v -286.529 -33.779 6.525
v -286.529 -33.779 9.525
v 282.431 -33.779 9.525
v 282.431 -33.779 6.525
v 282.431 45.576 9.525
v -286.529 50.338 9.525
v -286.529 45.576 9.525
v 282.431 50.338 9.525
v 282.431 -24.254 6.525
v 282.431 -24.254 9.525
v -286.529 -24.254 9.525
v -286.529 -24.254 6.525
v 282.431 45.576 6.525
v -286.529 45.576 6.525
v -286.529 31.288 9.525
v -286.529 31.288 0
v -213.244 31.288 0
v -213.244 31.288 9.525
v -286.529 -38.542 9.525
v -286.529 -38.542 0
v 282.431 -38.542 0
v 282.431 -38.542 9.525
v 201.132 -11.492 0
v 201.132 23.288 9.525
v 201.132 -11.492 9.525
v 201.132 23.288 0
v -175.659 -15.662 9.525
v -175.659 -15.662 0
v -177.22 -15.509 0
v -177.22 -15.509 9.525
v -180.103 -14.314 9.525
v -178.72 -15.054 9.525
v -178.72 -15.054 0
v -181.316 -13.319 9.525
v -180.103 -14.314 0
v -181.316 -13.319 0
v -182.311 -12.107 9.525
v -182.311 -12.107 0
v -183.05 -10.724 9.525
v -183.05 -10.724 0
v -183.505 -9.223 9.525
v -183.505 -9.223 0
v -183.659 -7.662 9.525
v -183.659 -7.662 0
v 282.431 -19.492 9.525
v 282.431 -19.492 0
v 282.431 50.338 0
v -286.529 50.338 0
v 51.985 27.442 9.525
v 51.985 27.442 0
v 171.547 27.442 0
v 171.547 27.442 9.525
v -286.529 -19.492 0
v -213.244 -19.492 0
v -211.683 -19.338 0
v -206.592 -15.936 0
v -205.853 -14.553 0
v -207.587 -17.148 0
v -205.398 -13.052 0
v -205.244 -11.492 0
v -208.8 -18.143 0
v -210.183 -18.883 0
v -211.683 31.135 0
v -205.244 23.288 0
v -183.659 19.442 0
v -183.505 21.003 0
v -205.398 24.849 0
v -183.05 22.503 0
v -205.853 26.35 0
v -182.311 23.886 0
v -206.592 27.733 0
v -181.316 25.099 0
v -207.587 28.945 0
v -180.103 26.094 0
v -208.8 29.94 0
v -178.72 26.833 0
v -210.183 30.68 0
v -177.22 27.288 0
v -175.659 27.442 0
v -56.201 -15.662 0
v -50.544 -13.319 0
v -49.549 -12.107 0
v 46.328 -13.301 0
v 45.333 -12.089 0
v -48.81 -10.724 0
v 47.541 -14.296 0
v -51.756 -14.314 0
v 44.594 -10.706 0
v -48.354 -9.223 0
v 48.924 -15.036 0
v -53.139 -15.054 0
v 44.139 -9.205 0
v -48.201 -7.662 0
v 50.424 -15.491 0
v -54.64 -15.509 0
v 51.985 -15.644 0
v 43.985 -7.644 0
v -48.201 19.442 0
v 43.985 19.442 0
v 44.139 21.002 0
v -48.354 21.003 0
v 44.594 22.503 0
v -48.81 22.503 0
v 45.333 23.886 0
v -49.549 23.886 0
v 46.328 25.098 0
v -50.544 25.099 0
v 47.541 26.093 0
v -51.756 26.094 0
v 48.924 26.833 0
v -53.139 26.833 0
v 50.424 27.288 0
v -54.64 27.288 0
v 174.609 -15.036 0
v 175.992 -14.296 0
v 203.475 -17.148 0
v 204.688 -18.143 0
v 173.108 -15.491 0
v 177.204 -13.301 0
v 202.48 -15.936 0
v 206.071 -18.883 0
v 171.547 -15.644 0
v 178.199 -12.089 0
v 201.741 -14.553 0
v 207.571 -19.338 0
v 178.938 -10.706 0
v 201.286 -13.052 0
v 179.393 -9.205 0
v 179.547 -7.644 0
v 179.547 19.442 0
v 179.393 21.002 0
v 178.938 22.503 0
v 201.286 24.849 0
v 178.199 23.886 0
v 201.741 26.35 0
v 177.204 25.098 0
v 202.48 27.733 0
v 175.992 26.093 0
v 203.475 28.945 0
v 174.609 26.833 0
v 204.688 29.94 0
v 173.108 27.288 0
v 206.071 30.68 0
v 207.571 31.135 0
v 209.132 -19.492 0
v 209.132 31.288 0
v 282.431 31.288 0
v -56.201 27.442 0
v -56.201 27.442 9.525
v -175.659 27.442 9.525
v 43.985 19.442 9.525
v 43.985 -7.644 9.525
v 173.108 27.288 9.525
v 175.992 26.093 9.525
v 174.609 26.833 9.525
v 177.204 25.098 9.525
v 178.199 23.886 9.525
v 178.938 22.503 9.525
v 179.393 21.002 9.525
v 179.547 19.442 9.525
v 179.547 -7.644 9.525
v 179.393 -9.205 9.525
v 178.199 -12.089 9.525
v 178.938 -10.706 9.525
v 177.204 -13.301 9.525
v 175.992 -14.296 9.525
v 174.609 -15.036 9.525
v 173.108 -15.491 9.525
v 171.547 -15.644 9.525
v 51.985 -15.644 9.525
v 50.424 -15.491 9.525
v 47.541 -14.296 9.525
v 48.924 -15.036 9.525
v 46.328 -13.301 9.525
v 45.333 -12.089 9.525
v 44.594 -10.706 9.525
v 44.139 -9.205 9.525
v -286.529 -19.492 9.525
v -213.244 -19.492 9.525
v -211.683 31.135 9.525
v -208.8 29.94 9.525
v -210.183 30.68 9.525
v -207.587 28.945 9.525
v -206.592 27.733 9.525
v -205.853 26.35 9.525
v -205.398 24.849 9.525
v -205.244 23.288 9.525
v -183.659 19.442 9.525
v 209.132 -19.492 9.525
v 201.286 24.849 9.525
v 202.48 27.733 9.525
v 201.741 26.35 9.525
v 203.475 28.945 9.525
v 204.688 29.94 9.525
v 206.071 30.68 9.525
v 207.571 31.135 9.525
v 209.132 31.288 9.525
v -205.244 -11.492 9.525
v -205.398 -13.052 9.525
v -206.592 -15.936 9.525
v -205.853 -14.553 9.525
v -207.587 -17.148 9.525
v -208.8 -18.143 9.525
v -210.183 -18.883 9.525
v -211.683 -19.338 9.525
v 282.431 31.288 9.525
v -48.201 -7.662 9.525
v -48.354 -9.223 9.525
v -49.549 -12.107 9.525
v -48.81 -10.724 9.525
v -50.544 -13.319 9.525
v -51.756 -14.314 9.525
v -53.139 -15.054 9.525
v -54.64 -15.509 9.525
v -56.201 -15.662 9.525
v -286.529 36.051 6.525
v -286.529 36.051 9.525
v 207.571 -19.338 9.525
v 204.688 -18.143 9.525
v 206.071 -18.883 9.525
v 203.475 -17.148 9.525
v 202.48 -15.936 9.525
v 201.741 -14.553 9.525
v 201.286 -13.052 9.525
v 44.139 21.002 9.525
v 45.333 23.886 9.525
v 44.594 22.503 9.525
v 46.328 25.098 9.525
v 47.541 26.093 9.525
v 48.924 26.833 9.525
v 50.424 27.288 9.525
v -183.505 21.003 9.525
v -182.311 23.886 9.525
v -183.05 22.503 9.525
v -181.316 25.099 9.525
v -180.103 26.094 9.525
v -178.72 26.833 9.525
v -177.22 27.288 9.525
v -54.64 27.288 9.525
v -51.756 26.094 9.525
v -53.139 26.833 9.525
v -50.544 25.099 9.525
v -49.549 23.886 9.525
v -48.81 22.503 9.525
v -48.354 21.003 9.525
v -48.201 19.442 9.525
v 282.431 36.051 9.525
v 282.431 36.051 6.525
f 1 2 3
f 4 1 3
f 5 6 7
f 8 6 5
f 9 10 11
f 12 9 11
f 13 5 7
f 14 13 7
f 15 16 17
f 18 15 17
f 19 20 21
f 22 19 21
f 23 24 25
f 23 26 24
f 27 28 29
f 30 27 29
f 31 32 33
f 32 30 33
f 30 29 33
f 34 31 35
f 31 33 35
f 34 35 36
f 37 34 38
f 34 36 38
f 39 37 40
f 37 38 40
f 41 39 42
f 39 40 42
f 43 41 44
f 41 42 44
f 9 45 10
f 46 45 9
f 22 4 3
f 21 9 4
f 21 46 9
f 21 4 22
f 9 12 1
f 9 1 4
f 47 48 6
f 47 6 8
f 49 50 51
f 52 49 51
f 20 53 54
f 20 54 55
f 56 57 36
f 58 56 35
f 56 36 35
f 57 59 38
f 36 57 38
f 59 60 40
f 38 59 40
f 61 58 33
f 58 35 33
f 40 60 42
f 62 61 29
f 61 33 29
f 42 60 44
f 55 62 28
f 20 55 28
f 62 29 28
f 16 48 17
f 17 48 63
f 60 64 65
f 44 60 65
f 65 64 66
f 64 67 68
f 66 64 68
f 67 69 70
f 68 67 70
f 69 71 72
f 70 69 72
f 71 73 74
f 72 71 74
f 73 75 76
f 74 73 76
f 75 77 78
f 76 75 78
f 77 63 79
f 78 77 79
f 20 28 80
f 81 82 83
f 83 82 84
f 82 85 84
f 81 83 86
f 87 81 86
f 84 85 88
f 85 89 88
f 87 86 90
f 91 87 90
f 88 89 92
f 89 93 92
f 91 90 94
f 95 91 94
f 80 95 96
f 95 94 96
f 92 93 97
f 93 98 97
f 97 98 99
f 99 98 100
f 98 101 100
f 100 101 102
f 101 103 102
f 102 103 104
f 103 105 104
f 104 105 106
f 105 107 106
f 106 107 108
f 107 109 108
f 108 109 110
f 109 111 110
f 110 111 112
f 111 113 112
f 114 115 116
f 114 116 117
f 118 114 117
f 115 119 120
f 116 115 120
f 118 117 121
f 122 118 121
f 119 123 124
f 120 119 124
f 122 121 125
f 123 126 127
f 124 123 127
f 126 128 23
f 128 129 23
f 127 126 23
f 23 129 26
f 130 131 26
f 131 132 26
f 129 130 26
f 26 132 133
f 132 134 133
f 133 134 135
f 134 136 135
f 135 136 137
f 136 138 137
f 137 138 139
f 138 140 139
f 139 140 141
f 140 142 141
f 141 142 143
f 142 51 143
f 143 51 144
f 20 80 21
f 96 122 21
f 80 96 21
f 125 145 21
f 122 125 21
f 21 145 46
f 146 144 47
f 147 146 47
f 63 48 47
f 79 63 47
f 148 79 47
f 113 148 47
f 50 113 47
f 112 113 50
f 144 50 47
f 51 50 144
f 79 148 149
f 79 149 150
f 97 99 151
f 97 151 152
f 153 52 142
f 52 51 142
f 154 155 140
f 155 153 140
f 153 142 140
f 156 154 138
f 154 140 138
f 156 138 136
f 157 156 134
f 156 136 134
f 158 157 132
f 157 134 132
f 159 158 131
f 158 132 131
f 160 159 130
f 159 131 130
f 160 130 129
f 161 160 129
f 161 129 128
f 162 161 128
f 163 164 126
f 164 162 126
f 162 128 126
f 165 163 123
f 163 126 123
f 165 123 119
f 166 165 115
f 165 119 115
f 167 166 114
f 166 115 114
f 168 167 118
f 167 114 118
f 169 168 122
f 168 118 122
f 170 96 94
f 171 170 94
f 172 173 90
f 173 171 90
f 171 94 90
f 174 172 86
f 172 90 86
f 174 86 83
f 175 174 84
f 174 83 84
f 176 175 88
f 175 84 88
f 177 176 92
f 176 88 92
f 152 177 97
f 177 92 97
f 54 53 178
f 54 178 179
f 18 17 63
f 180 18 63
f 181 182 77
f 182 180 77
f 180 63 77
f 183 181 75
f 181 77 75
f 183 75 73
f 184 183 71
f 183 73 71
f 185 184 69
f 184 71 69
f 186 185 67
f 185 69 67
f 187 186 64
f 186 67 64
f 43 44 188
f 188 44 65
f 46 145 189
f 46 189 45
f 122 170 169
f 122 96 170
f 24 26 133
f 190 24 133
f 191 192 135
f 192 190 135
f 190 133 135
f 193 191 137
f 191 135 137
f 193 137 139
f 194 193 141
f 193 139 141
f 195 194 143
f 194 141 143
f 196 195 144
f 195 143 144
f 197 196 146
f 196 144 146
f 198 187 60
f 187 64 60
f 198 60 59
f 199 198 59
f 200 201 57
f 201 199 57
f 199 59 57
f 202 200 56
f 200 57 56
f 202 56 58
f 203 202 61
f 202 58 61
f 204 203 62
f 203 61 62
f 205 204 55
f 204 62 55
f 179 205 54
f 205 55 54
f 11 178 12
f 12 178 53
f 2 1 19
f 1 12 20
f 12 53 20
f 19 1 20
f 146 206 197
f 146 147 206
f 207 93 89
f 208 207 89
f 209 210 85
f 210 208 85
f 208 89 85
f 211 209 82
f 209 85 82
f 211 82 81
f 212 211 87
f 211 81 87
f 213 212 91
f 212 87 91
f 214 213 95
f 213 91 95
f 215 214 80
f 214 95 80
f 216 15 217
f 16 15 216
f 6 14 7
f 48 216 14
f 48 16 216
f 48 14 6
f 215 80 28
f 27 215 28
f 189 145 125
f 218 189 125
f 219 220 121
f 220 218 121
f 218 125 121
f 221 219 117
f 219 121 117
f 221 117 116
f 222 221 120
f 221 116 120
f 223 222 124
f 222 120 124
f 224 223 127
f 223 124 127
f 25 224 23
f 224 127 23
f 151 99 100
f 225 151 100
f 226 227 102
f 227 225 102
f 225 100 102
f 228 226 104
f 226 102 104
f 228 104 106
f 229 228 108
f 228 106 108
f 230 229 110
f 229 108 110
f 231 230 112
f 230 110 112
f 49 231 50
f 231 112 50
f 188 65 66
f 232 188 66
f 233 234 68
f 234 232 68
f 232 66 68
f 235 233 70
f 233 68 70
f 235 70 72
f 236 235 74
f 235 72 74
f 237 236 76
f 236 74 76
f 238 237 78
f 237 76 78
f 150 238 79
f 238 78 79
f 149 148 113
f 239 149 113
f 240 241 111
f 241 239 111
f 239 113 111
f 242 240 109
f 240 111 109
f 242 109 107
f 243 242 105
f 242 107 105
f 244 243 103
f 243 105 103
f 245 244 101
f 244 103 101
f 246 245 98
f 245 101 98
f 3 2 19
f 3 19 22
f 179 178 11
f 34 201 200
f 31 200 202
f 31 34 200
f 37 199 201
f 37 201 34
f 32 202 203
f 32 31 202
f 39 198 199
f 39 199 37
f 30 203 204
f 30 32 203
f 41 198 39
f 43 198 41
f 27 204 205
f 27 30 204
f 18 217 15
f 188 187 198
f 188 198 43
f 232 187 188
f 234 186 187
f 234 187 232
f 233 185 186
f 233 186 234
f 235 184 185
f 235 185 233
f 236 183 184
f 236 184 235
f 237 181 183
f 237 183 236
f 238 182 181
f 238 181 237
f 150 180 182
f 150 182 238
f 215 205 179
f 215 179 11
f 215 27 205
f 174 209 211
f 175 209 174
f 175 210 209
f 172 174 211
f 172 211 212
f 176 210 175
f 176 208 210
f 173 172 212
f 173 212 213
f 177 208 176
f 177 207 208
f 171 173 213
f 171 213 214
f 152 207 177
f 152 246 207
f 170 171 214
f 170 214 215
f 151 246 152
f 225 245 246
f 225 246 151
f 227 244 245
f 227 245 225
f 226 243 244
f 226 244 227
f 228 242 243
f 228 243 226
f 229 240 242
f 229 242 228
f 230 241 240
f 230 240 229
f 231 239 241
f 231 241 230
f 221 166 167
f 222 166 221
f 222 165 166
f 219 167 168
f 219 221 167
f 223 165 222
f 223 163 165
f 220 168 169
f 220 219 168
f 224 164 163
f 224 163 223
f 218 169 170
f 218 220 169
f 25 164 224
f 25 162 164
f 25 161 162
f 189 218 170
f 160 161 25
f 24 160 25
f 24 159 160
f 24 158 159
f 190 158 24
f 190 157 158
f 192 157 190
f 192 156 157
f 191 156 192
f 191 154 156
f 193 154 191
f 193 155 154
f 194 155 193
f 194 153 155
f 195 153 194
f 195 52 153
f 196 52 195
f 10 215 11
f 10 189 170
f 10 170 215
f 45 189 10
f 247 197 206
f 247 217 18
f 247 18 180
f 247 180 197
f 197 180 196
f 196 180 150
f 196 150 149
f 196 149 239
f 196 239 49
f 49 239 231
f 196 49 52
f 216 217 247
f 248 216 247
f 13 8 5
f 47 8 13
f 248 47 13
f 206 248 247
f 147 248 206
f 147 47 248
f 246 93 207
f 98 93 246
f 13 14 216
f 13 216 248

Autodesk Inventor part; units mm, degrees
ref_plane "YZ Plane" through (0, 0, 0) normal (1, 0, 0) x (0, 1, 0)
ref_plane "XZ Plane" through (0, 0, 0) normal (0, 1, 0) x (-1, 0, 0)
ref_plane "XY Plane" through (0, 0, 0) normal (0, 0, 1) x (1, 0, 0)
sketch "Sketch1" plane through (0, 0, 0) normal (0, 0, 1) x (1, 0, 0)
  line L0 (-56.2006, 27.4418) -> (-175.6588, 27.4418)
  line L1 (-56.2006, -15.6625) -> (-175.6588, -15.6625)
  line L2 (-48.2006, -7.6625) -> (-48.2006, 19.4418)
  line L3 (-183.6588, -7.6625) -> (-183.6588, 19.4418)
  line L4 (-286.5288, -19.4915) -> (-213.2441, -19.4915)
  line L5 (-286.5288, 31.2885) -> (-213.2441, 31.2885)
  line L6 (-205.2441, 23.2885) -> (-205.2441, -11.4915)
  line L7 (51.9852, 27.4415) -> (171.5472, 27.4415)
  line L8 (51.9852, -15.6445) -> (171.5472, -15.6445)
  line L9 (43.9852, 19.4415) -> (43.9852, -7.6445)
  line L10 (179.5472, 19.4415) -> (179.5472, -7.6445)
  arc A0 (-205.2441, 23.2885) -> (-213.2441, 31.2885) centre (-213.2441, 23.2885) ccw
  arc A1 (-175.6588, 27.4418) -> (-183.6588, 19.4418) centre (-175.6588, 19.4418) ccw
  arc A2 (-183.6588, -7.6625) -> (-175.6588, -15.6625) centre (-175.6588, -7.6625) ccw
  arc A3 (-56.2006, -15.6625) -> (-48.2006, -7.6625) centre (-56.2006, -7.6625) ccw
  arc A4 (-48.2006, 19.4418) -> (-56.2006, 27.4418) centre (-56.2006, 19.4418) ccw
  arc A5 (-213.2441, -19.4915) -> (-205.2441, -11.4915) centre (-213.2441, -11.4915) ccw
  arc A6 (51.9852, 27.4415) -> (43.9852, 19.4415) centre (51.9852, 19.4415) ccw
  arc A7 (43.9852, -7.6445) -> (51.9852, -15.6445) centre (51.9852, -7.6445) ccw
  arc A8 (171.5472, -15.6445) -> (179.5472, -7.6445) centre (171.5472, -7.6445) ccw
  arc A9 (179.5472, 19.4415) -> (171.5472, 27.4415) centre (171.5472, 19.4415) ccw
  line L11 (-286.5288, 50.3385) -> (282.4312, 50.3385)
  line L12 (-286.5288, -38.5415) -> (282.4312, -38.5415)
  line L13 (-286.5288, 31.2885) -> (-286.5288, 50.3385)
  line L14 (-286.5288, -19.4915) -> (-286.5288, -38.5415)
  line L15 (179.5472, 5.8985) -> (201.1322, 5.9085)
  line L16 (282.4312, 31.2885) -> (209.1322, 31.2885)
  line L17 (201.1322, 23.2885) -> (201.1322, -11.4915)
  line L18 (209.1322, -19.4915) -> (282.4312, -19.4915)
  arc A10 (201.1322, -11.4915) -> (209.1322, -19.4915) centre (209.1322, -11.4915) ccw
  arc A11 (209.1322, 31.2885) -> (201.1322, 23.2885) centre (209.1322, 23.2885) ccw
  line L19 (282.4312, 50.3385) -> (282.4312, 31.2885)
  line L20 (282.4312, -19.4915) -> (282.4312, -38.5415)
  point P0 (0, 0)
  point P1 (0, 0)
  point P2 (-209.4751, 31.2885)
  point P3 (-205.2441, 26.6389)
  point P4 (-209.4751, -19.4915)
  point P5 (-179.9924, 27.4418)
  point P6 (-183.6588, 23.2495)
  point P7 (-183.6588, -11.4325)
  point P8 (-179.4288, -15.6625)
  point P9 (-48.2006, 23.2495)
  point P10 (-52.4306, 27.4418)
  point P11 (-52.9924, -15.6625)
  point P12 (-48.2006, -11.4325)
  point P13 (-205.2441, -15.2625)
  point P14 (48.2152, 27.4415)
  point P15 (43.9852, 23.2115)
  point P16 (48.2152, -15.6445)
  point P17 (179.5472, 23.2115)
  point P18 (175.3172, 27.4415)
  point P19 (175.3172, -15.6445)
  point P20 (179.5472, -11.4145)
  point P21 (43.9852, -11.4145)
  dimension "d0" = 135.4582
  dimension "d1" = 43.1043
  dimension "d4" = 21.5853
  dimension "d5" = 92.1858
  dimension "d8" = 8
  dimension "d9" = 8
  dimension "d10" = 8
  dimension "d50" = 50.7799
  dimension "d62" = 88.8799
  dimension "d63" = 19.05
  dimension "d64" = 50.7799
ref_plane "Work Plane7" through (0, 0, 9.525) normal (0, 0, 1) x (1, 0, 0)
extrude "Extrusion6" add sketch "Sketch1" along normal blind 9.525
sketch "Sketch7" plane through (0, 0, 9.525) normal (0, 0, 1) x (1, 0, 0)
  line L0 (-286.5288, 50.3385) -> (-286.5288, 31.2885) projected
  line L1 (282.4312, 31.2885) -> (282.4312, 50.3385) projected
  line L2 (-286.5288, 45.576) -> (282.4312, 45.576)
  line L3 (282.4312, 45.576) -> (282.4312, 36.051)
  line L4 (282.4312, 36.051) -> (-286.5288, 36.051)
  line L5 (-286.5288, 36.051) -> (-286.5288, 45.576)
  line L6 (282.4312, 50.3385) -> (-286.5288, 50.3385) projected
  line L7 (282.4312, -38.5415) -> (282.4312, -19.4915) projected
  line L8 (-286.5288, -24.254) -> (282.4312, -24.254)
  line L9 (282.4312, -24.254) -> (282.4312, -33.779)
  line L10 (282.4312, -33.779) -> (-286.5288, -33.779)
  line L11 (-286.5288, -33.779) -> (-286.5288, -24.254)
  line L12 (-286.5288, -38.5415) -> (282.4312, -38.5415) projected
  point P0 (0, 0)
  dimension "d98" = 9.525
  dimension "d99" = 4.7625
  dimension "d100" = 4.7625
  dimension "d101" = 9.525
emboss "Emboss7" sketch "Sketch7" operation cut depth 3 direction (0, 0, -1) contours L2 L1 L4 L0 | L10 L11 L8 L7
properties part number "top" material "Aluminum 6061"
